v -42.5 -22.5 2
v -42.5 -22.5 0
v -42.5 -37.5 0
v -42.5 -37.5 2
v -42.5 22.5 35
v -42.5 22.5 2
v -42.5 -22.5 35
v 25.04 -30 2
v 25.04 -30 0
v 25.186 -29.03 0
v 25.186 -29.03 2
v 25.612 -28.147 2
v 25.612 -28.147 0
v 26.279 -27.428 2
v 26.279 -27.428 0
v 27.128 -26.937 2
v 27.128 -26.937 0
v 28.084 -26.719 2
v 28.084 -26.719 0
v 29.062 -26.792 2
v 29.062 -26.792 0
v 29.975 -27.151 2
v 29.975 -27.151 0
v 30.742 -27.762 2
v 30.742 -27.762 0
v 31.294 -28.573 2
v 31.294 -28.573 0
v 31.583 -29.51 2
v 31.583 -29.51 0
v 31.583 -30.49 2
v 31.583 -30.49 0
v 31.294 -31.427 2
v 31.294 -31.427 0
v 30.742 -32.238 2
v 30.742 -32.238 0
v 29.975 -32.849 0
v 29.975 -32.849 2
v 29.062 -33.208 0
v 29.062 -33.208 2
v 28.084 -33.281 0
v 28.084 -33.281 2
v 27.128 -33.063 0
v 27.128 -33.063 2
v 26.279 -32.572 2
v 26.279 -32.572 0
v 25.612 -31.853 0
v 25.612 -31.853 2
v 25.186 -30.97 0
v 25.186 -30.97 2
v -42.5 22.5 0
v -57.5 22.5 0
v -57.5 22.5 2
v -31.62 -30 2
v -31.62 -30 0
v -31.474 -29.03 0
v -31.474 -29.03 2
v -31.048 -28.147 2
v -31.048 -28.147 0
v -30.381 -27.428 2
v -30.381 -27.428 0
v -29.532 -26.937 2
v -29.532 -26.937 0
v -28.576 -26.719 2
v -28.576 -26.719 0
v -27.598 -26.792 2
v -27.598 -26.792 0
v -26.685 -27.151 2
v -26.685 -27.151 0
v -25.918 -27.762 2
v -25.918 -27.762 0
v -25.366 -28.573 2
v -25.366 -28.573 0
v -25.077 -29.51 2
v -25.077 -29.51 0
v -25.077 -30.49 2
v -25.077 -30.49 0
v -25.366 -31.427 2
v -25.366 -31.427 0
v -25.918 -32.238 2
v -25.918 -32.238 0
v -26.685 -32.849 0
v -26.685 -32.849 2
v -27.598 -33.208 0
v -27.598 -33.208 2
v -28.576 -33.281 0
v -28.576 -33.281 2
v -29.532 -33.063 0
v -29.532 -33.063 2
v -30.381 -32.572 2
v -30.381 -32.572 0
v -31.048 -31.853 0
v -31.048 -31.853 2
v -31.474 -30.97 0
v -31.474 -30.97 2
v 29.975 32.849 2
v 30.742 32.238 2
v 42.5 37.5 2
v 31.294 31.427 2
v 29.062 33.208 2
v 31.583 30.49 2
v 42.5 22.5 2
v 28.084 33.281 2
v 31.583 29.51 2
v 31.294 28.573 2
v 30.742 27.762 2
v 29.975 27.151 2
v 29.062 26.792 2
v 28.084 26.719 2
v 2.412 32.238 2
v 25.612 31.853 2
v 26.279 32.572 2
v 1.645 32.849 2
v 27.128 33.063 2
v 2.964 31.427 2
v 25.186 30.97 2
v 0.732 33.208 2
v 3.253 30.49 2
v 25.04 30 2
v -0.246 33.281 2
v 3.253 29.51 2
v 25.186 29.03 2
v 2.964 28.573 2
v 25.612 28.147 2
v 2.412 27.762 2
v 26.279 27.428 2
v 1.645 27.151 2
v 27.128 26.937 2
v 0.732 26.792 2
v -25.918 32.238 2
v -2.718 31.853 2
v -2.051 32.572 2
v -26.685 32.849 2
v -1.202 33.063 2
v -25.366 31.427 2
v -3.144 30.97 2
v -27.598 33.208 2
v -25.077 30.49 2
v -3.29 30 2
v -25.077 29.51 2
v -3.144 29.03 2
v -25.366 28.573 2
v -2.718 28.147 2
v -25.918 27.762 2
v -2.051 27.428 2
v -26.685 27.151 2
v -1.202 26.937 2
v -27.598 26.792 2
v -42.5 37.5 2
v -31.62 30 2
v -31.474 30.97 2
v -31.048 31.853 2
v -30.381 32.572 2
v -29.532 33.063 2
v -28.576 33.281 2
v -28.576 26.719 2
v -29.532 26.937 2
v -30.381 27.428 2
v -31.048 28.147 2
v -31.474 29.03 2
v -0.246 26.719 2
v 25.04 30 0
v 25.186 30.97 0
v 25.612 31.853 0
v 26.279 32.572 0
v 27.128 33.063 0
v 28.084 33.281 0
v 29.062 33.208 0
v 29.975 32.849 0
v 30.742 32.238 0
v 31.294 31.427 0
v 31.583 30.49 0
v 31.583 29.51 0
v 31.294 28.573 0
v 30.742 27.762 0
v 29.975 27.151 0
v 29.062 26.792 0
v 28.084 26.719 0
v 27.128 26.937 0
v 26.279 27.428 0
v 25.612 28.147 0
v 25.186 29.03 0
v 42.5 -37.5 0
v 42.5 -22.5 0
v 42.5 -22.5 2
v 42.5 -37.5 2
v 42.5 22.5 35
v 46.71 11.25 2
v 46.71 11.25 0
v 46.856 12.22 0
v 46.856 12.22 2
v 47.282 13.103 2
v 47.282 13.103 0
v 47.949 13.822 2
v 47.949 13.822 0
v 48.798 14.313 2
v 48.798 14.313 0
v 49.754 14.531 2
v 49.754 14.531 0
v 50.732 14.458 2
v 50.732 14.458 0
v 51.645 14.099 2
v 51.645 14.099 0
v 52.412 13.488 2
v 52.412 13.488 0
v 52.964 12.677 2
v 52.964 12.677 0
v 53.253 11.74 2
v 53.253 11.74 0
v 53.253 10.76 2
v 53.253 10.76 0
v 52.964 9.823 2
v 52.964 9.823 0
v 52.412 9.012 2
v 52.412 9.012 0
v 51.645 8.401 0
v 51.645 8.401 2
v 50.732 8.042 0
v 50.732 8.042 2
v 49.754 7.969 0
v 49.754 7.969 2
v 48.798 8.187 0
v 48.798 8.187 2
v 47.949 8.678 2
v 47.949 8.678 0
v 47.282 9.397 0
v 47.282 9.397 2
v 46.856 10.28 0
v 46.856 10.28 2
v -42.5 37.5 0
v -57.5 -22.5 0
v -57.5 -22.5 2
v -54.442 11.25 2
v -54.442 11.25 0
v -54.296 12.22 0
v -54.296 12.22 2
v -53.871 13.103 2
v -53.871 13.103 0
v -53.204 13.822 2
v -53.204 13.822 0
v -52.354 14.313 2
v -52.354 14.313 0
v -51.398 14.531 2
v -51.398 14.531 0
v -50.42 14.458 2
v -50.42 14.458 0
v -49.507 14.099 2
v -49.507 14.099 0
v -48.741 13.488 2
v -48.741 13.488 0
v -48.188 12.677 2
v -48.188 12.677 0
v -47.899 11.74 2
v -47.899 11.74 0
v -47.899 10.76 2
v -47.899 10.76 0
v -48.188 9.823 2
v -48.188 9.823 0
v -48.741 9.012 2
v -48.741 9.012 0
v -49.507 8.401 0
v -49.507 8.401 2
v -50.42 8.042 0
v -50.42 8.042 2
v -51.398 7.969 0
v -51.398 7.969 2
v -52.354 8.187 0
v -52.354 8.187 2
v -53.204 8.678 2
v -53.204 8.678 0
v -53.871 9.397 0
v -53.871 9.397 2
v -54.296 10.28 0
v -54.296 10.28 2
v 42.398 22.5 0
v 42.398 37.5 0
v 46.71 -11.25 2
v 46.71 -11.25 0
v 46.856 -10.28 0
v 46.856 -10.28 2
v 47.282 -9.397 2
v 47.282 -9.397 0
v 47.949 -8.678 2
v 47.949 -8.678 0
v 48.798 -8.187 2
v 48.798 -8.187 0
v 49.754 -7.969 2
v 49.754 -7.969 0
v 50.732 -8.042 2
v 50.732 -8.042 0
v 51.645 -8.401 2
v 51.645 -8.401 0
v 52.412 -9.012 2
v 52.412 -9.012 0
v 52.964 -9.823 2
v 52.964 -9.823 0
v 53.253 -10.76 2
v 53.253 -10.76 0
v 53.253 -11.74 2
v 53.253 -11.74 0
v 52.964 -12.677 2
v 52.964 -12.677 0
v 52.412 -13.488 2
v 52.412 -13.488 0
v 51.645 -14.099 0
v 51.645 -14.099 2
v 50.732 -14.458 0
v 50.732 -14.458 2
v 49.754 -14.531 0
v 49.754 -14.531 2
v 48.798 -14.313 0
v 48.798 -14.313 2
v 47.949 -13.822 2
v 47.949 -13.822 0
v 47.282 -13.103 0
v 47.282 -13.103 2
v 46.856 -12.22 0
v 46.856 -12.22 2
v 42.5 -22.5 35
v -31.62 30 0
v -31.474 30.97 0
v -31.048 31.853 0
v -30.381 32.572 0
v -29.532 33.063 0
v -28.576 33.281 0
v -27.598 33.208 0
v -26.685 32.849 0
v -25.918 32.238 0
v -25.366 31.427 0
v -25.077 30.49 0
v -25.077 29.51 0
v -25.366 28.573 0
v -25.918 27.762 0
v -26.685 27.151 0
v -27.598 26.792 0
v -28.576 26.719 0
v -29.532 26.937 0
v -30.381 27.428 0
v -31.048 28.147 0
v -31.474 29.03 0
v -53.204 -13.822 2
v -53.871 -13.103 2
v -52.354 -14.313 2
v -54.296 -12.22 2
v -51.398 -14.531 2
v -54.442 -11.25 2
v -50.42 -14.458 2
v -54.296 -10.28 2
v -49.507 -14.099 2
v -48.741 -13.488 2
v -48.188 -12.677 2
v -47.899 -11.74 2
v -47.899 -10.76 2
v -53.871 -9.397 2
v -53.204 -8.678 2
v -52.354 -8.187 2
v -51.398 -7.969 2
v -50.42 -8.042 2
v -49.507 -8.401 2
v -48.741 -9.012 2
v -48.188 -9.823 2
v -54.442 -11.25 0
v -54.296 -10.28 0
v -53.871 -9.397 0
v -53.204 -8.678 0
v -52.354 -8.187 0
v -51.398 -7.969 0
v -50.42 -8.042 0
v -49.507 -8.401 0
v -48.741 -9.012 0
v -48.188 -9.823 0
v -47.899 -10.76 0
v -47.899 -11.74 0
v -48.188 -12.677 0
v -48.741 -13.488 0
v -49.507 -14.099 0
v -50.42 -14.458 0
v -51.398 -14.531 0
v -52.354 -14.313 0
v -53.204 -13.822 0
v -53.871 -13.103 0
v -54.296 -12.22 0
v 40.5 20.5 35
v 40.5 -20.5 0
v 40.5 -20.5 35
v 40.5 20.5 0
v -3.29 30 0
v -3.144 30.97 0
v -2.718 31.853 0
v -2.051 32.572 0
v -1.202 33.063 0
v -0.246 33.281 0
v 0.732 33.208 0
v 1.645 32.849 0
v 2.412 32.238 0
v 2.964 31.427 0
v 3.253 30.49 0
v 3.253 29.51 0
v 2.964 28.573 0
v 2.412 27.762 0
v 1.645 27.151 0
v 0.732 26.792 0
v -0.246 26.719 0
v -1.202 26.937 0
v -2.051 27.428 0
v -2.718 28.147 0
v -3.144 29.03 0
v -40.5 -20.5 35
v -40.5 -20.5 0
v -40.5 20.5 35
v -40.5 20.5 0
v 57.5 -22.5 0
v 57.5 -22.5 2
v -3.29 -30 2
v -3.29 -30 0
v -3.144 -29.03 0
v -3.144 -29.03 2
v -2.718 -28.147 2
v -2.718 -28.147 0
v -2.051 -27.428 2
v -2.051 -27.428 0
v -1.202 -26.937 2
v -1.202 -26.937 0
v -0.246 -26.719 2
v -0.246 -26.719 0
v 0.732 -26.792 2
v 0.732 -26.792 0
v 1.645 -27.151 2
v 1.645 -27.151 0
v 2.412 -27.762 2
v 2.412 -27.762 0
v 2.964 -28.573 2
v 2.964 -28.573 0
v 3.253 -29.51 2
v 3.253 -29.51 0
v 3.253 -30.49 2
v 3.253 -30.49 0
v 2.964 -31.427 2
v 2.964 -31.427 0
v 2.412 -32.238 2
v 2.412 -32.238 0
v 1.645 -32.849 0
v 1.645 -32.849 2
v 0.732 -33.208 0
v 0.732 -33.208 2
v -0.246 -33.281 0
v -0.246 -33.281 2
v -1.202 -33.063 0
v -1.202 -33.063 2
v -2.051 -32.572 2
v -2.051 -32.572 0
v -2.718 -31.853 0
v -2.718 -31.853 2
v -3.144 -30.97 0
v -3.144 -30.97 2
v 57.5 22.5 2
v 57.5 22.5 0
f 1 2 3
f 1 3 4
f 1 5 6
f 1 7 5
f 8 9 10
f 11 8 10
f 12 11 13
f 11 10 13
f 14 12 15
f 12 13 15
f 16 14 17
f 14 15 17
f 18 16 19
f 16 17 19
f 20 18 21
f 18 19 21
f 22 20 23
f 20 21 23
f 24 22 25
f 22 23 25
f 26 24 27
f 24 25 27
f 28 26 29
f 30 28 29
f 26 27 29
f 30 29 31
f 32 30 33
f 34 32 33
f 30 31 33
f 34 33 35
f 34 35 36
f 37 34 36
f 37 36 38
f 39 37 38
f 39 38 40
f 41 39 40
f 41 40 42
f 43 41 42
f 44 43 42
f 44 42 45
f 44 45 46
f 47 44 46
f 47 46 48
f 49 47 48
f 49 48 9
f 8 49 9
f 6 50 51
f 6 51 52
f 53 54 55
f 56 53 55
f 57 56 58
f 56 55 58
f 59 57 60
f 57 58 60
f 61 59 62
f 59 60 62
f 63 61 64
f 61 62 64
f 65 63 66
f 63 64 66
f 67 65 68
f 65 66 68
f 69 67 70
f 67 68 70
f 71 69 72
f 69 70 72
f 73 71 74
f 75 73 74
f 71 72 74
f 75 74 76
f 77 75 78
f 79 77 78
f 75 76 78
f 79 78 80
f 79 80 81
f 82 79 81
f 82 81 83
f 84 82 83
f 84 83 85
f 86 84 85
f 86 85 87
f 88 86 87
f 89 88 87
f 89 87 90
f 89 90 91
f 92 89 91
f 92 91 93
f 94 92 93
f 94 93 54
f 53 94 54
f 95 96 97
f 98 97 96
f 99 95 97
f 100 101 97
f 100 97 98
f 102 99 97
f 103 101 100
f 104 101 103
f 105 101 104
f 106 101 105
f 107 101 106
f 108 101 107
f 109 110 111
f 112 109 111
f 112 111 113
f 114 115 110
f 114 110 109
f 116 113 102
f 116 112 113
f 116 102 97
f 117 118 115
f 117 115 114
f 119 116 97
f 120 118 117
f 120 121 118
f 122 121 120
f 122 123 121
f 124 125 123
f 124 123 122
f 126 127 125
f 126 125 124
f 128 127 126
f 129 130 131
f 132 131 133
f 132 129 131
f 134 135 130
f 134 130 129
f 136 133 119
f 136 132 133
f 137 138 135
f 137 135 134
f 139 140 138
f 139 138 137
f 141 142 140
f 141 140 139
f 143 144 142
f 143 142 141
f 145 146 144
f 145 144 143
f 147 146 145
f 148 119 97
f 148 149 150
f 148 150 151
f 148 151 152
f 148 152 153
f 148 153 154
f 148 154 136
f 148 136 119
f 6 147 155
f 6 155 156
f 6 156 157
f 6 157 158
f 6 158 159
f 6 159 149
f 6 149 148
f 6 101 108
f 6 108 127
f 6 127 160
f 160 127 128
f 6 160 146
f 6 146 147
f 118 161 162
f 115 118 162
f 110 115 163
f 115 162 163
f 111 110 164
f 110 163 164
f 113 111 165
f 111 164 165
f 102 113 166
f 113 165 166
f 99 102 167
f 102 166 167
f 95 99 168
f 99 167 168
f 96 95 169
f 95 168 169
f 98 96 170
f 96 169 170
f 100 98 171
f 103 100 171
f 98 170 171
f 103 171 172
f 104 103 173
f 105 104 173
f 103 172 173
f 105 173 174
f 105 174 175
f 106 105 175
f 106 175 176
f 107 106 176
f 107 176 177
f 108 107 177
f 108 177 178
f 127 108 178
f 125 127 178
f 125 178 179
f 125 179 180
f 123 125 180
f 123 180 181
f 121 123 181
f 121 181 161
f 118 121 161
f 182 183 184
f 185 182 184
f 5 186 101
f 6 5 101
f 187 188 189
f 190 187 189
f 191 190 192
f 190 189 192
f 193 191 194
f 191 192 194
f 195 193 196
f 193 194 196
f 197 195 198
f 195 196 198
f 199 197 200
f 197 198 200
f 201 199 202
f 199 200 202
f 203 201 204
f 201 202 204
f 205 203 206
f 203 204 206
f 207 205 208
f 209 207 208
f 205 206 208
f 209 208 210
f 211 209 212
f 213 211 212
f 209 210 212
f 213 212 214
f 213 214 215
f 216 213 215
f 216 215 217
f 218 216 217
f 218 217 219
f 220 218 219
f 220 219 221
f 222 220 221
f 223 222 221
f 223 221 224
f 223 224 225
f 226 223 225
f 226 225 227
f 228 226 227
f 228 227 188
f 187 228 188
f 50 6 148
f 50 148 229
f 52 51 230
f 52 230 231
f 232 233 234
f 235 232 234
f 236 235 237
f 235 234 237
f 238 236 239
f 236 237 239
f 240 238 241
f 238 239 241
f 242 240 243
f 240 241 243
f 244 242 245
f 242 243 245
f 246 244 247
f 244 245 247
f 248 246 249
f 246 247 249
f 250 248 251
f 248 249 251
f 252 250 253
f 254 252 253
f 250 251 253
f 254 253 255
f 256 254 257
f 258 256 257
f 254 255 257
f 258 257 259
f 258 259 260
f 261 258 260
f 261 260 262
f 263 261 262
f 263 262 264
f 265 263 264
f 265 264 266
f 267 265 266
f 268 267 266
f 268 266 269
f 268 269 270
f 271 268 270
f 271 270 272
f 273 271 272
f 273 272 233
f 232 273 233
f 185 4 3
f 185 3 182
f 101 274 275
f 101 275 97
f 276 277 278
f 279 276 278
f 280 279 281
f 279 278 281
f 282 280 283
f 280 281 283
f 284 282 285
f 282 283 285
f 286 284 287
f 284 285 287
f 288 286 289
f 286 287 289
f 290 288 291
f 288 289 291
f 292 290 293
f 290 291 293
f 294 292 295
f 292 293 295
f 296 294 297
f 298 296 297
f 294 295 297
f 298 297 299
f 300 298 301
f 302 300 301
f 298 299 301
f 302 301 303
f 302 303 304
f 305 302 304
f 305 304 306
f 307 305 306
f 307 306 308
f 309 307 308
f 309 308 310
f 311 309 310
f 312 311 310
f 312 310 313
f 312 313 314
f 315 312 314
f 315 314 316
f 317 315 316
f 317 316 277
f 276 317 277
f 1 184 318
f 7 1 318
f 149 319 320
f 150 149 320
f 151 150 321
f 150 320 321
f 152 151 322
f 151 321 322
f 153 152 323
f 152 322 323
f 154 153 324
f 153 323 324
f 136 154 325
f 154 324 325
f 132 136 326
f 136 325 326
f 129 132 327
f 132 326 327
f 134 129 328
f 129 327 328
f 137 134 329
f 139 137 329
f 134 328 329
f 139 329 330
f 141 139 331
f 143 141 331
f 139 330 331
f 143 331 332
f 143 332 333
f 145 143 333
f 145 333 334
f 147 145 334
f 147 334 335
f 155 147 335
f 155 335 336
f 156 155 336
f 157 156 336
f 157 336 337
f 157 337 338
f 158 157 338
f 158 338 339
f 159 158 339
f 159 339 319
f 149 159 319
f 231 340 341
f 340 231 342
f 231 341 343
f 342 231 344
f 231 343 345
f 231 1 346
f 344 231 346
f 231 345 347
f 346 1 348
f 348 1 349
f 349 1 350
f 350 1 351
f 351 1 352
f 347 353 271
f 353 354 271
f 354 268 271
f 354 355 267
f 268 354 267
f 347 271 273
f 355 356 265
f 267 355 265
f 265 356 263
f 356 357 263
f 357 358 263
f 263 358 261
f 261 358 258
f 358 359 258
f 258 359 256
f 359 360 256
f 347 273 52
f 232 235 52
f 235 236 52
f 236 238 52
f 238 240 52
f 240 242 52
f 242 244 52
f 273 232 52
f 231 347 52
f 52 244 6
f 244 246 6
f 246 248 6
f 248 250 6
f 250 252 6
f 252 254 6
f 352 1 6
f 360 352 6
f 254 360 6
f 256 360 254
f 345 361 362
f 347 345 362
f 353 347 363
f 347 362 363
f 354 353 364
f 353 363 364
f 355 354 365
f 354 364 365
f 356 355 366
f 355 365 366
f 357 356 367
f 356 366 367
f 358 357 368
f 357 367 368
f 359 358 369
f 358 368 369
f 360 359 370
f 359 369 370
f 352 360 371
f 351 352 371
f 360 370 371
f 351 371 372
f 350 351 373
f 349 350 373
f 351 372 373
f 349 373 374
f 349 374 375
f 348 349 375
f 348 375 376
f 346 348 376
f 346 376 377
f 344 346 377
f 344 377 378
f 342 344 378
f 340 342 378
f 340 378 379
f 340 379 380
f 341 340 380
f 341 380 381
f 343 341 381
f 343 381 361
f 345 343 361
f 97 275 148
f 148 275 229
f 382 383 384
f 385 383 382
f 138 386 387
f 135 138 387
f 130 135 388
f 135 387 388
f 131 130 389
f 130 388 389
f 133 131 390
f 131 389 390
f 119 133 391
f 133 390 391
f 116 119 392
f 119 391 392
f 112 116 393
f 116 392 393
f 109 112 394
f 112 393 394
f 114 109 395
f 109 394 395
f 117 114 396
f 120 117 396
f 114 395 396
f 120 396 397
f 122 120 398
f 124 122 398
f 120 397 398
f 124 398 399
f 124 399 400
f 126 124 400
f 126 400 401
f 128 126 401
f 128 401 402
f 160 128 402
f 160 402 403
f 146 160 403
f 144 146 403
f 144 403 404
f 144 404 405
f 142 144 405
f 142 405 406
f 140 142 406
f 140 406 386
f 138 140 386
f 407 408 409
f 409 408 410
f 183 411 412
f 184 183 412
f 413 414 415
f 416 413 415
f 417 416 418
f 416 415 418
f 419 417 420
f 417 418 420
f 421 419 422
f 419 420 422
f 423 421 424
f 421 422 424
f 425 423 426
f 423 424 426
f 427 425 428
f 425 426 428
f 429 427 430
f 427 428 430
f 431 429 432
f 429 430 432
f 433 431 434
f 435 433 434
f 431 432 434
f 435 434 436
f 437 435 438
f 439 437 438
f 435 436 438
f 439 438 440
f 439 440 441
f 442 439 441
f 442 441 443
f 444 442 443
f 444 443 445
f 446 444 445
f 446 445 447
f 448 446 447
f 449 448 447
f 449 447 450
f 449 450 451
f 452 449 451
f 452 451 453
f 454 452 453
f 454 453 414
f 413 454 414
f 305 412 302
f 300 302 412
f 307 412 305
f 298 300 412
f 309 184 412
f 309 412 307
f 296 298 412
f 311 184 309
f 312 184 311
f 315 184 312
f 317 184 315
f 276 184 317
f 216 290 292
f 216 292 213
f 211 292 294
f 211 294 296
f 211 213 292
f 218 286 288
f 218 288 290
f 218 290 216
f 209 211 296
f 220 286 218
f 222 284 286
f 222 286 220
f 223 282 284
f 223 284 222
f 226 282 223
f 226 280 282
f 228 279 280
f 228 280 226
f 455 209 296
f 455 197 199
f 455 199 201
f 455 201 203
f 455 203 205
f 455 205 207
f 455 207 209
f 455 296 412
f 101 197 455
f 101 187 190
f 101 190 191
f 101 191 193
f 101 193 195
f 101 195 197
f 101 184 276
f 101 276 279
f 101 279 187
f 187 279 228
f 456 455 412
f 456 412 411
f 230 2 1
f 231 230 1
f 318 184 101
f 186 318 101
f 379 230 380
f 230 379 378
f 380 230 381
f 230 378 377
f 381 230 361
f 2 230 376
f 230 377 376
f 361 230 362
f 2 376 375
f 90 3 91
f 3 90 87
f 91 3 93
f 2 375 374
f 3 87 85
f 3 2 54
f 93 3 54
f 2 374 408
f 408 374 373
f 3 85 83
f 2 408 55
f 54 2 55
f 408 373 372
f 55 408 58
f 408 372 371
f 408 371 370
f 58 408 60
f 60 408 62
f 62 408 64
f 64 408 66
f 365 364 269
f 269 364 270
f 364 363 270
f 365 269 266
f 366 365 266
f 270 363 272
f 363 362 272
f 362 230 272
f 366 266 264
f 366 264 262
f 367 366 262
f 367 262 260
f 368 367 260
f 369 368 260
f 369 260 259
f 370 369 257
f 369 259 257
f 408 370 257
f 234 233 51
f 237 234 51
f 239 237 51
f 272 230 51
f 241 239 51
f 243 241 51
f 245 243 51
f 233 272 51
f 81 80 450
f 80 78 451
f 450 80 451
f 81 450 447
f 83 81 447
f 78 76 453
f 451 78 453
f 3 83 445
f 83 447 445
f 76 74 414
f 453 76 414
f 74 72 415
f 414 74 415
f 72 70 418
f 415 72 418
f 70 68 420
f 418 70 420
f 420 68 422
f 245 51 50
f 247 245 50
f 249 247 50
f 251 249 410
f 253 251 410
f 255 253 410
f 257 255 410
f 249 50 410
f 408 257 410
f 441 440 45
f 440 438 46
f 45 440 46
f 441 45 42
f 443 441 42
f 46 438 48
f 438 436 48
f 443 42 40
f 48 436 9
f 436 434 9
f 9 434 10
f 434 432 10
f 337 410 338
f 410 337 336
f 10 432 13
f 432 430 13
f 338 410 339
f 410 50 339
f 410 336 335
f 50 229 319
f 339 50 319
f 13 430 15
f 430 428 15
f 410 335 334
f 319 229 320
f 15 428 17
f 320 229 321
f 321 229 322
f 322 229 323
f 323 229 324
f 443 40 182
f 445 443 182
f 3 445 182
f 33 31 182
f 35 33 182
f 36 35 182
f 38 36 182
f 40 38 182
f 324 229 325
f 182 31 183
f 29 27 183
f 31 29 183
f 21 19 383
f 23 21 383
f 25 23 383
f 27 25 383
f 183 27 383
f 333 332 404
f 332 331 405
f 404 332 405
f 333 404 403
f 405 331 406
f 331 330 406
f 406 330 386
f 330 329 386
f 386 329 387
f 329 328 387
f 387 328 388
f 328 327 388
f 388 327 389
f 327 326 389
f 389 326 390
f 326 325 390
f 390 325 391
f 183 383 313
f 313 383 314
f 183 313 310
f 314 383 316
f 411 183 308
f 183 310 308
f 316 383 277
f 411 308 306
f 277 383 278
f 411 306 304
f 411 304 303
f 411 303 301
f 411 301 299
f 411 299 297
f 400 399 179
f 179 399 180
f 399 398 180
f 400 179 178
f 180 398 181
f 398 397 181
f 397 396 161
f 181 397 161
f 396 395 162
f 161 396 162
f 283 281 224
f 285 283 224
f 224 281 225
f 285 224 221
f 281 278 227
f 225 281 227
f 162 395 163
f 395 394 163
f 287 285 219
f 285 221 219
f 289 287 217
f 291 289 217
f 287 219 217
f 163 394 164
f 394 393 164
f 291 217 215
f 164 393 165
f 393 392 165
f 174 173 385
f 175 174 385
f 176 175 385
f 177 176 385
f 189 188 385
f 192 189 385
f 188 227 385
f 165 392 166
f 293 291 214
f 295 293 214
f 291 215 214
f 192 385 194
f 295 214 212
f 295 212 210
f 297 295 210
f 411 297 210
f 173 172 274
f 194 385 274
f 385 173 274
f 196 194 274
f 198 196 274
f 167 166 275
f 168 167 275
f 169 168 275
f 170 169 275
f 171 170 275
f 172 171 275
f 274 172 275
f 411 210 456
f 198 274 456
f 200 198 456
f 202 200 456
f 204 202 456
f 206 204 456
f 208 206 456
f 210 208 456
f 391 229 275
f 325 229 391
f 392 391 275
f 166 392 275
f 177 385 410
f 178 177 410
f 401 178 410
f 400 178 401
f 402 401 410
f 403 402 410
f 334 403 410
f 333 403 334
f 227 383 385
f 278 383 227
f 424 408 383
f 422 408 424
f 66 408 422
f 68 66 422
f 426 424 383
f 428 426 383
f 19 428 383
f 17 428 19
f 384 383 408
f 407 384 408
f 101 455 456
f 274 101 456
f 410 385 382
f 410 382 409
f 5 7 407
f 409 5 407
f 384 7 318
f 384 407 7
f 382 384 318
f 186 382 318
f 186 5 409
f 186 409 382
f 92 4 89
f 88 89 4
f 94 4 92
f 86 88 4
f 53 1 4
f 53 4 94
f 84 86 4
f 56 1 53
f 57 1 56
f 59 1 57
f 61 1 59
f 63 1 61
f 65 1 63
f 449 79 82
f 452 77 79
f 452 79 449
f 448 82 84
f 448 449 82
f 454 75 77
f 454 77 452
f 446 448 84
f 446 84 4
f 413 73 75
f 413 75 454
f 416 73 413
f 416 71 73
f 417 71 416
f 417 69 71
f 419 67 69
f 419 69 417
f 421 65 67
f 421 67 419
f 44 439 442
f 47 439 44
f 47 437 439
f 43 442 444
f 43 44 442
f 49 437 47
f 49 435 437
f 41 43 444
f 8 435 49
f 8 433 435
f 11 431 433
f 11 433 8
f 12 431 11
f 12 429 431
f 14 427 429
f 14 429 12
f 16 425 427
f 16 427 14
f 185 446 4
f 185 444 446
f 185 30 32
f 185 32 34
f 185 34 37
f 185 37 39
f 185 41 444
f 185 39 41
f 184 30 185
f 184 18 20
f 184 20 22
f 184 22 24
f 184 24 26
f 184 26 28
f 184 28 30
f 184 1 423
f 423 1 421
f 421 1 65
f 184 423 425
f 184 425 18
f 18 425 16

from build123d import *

# Parameters (mm, degrees)
ESBO_O1_W                                      = 85
ESBO_O1_H                                      = 45
RESSALTO_EXTRUS_O1_DEPTH                       = 35
ESBO_O2_W                                      = 81
ESBO_O2_H                                      = 41
CORTE_EXTRUS_O1_DEPTH                          = 33
ESBO_O3_W                                      = 2
ESBO_O3_H                                      = 45
RESSALTO_EXTRUS_O2_DEPTH                       = 15
RESSALTO_EXTRUS_O3_DEPTH                       = 15
ESBO_O5_W                                      = 2
ESBO_O5_H                                      = 45
RESSALTO_EXTRUS_O4_DEPTH                       = 15
ESBO_O6_W                                      = 85
ESBO_O6_H                                      = 2
RESSALTO_EXTRUS_O5_DEPTH                       = 15
BROCA_DE_ROSQUEAR_DE_CANO_PARA_TARRAXA_D_D     = 6.579997
BROCA_DE_ROSQUEAR_DE_CANO_PARA_TARRAXA_D_DEPTH = 10
BROCA_DE_ROSQUEAR_DE_CANO_PARA_TARRAXA_D_TIP   = 1.976830535
CORTE_EXTRUS_O2_REACH                          = 37
ESBO_O9_W                                      = 81
ESBO_O9_H                                      = 41


with BuildPart() as part:
    # Esboço1 → Ressalto-extrusão1 (new body)
    with BuildSketch(Plane.XY):
        Rectangle(ESBO_O1_W, ESBO_O1_H)
    extrude(amount=RESSALTO_EXTRUS_O1_DEPTH)

    # Esboço2 → Corte-extrusão1 (cut)
    with BuildSketch(Plane(origin=(0, 0, 0), x_dir=(-1, 0, 0), z_dir=(0, 0, -1))):
        Rectangle(ESBO_O2_W, ESBO_O2_H)
    extrude(amount=-CORTE_EXTRUS_O1_DEPTH, mode=Mode.SUBTRACT)

    # Esboço3 → Ressalto-extrusão2 (add)
    with BuildSketch(Plane(origin=(42.5, 0, 0), x_dir=(0, 0, -1), z_dir=(1, 0, 0))):
        with Locations((-1, 0)):
            Rectangle(ESBO_O3_W, ESBO_O3_H)
    extrude(amount=RESSALTO_EXTRUS_O2_DEPTH)

    # Esboço4 → Ressalto-extrusão3 (add)
    with BuildSketch(Plane(origin=(0, 22.5, 0), x_dir=(1, 0, 0), z_dir=(0, 1, 0))):
        Polygon((42.397707887, 0), (42.5, -2), (-42.5, -2), (-42.5, 0), align=None)
    extrude(amount=RESSALTO_EXTRUS_O3_DEPTH)

    # Esboço5 → Ressalto-extrusão4 (add)
    with BuildSketch(Plane.ZY.offset(42.5)):
        with Locations((1, 0)):
            Rectangle(ESBO_O5_W, ESBO_O5_H)
    extrude(amount=RESSALTO_EXTRUS_O4_DEPTH)

    # Esboço6 → Ressalto-extrusão5 (add)
    with BuildSketch(Plane.XZ.offset(22.5)):
        with Locations((0, 1)):
            Rectangle(ESBO_O6_W, ESBO_O6_H)
    extrude(amount=RESSALTO_EXTRUS_O5_DEPTH)

    # Broca de rosquear de cano para tarraxa de 1/81
    with Locations(Plane.XY.offset(2)):
        with Locations((50, 11.25), (50, -11.25), (-51.152400613, -11.25), (-51.152400613, 11.25), (-28.33, 30), (0, 30), (28.33, 30), (28.33, -30), (0, -30), (-28.33, -30)):
            Hole(BROCA_DE_ROSQUEAR_DE_CANO_PARA_TARRAXA_D_D / 2, depth=BROCA_DE_ROSQUEAR_DE_CANO_PARA_TARRAXA_D_DEPTH)
            with Locations((0, 0, -(BROCA_DE_ROSQUEAR_DE_CANO_PARA_TARRAXA_D_DEPTH + BROCA_DE_ROSQUEAR_DE_CANO_PARA_TARRAXA_D_TIP / 2))):  # 118° drill point
                Cone(0, BROCA_DE_ROSQUEAR_DE_CANO_PARA_TARRAXA_D_D / 2, BROCA_DE_ROSQUEAR_DE_CANO_PARA_TARRAXA_D_TIP, mode=Mode.SUBTRACT)

    # Esboço9 → Corte-extrusão2 (cut, up to next)
    with BuildSketch(Plane.XY.offset(35), mode=Mode.PRIVATE) as corte_extrus_o2_sk1:
        Rectangle(ESBO_O9_W, ESBO_O9_H)
    corte_extrus_o2_tool1 = extrude(corte_extrus_o2_sk1.sketch, amount=-CORTE_EXTRUS_O2_REACH, mode=Mode.PRIVATE) & part.part
    add(corte_extrus_o2_tool1.solids().sort_by_distance((0, 0, 35))[0], mode=Mode.SUBTRACT)


solid = part.part
